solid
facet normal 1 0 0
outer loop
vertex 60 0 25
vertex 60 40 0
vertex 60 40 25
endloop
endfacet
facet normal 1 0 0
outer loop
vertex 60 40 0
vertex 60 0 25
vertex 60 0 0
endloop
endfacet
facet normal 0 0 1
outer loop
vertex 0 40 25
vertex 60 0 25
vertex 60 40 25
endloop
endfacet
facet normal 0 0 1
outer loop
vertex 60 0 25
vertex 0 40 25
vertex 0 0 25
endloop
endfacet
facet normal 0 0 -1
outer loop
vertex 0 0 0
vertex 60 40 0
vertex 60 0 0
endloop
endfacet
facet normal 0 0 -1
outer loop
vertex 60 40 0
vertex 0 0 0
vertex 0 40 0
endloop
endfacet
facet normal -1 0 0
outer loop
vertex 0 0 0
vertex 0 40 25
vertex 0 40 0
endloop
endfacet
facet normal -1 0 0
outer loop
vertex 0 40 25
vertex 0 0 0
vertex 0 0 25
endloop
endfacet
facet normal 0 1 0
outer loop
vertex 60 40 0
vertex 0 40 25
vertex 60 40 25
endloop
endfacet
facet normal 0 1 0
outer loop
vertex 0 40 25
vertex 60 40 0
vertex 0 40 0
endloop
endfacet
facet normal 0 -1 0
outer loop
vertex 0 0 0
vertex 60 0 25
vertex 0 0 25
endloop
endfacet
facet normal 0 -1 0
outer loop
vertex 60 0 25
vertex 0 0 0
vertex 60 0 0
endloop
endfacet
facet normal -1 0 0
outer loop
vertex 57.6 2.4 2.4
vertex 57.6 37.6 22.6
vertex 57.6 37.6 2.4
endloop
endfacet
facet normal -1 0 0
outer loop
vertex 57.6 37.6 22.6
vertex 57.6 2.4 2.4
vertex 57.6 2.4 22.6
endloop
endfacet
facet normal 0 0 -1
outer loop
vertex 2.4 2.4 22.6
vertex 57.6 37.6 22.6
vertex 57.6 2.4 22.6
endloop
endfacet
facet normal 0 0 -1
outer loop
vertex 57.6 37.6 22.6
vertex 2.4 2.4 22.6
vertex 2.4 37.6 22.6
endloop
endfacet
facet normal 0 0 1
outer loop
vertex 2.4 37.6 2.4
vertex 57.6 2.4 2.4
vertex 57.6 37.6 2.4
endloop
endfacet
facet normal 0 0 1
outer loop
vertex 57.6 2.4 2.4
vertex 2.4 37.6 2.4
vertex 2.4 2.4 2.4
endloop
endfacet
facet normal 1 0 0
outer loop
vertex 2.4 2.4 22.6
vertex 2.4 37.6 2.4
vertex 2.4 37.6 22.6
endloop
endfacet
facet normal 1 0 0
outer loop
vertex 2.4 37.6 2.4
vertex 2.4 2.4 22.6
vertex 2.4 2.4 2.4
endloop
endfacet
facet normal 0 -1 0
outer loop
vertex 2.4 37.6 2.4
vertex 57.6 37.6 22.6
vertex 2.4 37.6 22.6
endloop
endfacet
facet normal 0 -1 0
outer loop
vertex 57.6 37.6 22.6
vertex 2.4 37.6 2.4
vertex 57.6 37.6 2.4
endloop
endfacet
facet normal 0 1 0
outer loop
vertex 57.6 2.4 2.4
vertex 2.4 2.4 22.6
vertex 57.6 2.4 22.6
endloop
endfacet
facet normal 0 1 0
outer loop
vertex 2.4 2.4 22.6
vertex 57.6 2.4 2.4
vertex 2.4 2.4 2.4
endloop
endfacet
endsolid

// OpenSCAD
// A sealed-cavity enclosure: an outer box with a fully enclosed internal
// void. The simplest part whose correctness is TOPOLOGICAL — watertight,
// one solid, genus 0 — which is exactly what a slicer or a reviewer cannot
// see from the outside and what a mesh measures without feature recognition.

w = 60;      // outer width  (x)
d = 40;      // outer depth  (y)
h = 25;      // outer height (z)
wall = 2.4;  // uniform wall

difference() {
    cube([w, d, h]);
    translate([wall, wall, wall])
        cube([w - 2 * wall, d - 2 * wall, h - 2 * wall]);
}
